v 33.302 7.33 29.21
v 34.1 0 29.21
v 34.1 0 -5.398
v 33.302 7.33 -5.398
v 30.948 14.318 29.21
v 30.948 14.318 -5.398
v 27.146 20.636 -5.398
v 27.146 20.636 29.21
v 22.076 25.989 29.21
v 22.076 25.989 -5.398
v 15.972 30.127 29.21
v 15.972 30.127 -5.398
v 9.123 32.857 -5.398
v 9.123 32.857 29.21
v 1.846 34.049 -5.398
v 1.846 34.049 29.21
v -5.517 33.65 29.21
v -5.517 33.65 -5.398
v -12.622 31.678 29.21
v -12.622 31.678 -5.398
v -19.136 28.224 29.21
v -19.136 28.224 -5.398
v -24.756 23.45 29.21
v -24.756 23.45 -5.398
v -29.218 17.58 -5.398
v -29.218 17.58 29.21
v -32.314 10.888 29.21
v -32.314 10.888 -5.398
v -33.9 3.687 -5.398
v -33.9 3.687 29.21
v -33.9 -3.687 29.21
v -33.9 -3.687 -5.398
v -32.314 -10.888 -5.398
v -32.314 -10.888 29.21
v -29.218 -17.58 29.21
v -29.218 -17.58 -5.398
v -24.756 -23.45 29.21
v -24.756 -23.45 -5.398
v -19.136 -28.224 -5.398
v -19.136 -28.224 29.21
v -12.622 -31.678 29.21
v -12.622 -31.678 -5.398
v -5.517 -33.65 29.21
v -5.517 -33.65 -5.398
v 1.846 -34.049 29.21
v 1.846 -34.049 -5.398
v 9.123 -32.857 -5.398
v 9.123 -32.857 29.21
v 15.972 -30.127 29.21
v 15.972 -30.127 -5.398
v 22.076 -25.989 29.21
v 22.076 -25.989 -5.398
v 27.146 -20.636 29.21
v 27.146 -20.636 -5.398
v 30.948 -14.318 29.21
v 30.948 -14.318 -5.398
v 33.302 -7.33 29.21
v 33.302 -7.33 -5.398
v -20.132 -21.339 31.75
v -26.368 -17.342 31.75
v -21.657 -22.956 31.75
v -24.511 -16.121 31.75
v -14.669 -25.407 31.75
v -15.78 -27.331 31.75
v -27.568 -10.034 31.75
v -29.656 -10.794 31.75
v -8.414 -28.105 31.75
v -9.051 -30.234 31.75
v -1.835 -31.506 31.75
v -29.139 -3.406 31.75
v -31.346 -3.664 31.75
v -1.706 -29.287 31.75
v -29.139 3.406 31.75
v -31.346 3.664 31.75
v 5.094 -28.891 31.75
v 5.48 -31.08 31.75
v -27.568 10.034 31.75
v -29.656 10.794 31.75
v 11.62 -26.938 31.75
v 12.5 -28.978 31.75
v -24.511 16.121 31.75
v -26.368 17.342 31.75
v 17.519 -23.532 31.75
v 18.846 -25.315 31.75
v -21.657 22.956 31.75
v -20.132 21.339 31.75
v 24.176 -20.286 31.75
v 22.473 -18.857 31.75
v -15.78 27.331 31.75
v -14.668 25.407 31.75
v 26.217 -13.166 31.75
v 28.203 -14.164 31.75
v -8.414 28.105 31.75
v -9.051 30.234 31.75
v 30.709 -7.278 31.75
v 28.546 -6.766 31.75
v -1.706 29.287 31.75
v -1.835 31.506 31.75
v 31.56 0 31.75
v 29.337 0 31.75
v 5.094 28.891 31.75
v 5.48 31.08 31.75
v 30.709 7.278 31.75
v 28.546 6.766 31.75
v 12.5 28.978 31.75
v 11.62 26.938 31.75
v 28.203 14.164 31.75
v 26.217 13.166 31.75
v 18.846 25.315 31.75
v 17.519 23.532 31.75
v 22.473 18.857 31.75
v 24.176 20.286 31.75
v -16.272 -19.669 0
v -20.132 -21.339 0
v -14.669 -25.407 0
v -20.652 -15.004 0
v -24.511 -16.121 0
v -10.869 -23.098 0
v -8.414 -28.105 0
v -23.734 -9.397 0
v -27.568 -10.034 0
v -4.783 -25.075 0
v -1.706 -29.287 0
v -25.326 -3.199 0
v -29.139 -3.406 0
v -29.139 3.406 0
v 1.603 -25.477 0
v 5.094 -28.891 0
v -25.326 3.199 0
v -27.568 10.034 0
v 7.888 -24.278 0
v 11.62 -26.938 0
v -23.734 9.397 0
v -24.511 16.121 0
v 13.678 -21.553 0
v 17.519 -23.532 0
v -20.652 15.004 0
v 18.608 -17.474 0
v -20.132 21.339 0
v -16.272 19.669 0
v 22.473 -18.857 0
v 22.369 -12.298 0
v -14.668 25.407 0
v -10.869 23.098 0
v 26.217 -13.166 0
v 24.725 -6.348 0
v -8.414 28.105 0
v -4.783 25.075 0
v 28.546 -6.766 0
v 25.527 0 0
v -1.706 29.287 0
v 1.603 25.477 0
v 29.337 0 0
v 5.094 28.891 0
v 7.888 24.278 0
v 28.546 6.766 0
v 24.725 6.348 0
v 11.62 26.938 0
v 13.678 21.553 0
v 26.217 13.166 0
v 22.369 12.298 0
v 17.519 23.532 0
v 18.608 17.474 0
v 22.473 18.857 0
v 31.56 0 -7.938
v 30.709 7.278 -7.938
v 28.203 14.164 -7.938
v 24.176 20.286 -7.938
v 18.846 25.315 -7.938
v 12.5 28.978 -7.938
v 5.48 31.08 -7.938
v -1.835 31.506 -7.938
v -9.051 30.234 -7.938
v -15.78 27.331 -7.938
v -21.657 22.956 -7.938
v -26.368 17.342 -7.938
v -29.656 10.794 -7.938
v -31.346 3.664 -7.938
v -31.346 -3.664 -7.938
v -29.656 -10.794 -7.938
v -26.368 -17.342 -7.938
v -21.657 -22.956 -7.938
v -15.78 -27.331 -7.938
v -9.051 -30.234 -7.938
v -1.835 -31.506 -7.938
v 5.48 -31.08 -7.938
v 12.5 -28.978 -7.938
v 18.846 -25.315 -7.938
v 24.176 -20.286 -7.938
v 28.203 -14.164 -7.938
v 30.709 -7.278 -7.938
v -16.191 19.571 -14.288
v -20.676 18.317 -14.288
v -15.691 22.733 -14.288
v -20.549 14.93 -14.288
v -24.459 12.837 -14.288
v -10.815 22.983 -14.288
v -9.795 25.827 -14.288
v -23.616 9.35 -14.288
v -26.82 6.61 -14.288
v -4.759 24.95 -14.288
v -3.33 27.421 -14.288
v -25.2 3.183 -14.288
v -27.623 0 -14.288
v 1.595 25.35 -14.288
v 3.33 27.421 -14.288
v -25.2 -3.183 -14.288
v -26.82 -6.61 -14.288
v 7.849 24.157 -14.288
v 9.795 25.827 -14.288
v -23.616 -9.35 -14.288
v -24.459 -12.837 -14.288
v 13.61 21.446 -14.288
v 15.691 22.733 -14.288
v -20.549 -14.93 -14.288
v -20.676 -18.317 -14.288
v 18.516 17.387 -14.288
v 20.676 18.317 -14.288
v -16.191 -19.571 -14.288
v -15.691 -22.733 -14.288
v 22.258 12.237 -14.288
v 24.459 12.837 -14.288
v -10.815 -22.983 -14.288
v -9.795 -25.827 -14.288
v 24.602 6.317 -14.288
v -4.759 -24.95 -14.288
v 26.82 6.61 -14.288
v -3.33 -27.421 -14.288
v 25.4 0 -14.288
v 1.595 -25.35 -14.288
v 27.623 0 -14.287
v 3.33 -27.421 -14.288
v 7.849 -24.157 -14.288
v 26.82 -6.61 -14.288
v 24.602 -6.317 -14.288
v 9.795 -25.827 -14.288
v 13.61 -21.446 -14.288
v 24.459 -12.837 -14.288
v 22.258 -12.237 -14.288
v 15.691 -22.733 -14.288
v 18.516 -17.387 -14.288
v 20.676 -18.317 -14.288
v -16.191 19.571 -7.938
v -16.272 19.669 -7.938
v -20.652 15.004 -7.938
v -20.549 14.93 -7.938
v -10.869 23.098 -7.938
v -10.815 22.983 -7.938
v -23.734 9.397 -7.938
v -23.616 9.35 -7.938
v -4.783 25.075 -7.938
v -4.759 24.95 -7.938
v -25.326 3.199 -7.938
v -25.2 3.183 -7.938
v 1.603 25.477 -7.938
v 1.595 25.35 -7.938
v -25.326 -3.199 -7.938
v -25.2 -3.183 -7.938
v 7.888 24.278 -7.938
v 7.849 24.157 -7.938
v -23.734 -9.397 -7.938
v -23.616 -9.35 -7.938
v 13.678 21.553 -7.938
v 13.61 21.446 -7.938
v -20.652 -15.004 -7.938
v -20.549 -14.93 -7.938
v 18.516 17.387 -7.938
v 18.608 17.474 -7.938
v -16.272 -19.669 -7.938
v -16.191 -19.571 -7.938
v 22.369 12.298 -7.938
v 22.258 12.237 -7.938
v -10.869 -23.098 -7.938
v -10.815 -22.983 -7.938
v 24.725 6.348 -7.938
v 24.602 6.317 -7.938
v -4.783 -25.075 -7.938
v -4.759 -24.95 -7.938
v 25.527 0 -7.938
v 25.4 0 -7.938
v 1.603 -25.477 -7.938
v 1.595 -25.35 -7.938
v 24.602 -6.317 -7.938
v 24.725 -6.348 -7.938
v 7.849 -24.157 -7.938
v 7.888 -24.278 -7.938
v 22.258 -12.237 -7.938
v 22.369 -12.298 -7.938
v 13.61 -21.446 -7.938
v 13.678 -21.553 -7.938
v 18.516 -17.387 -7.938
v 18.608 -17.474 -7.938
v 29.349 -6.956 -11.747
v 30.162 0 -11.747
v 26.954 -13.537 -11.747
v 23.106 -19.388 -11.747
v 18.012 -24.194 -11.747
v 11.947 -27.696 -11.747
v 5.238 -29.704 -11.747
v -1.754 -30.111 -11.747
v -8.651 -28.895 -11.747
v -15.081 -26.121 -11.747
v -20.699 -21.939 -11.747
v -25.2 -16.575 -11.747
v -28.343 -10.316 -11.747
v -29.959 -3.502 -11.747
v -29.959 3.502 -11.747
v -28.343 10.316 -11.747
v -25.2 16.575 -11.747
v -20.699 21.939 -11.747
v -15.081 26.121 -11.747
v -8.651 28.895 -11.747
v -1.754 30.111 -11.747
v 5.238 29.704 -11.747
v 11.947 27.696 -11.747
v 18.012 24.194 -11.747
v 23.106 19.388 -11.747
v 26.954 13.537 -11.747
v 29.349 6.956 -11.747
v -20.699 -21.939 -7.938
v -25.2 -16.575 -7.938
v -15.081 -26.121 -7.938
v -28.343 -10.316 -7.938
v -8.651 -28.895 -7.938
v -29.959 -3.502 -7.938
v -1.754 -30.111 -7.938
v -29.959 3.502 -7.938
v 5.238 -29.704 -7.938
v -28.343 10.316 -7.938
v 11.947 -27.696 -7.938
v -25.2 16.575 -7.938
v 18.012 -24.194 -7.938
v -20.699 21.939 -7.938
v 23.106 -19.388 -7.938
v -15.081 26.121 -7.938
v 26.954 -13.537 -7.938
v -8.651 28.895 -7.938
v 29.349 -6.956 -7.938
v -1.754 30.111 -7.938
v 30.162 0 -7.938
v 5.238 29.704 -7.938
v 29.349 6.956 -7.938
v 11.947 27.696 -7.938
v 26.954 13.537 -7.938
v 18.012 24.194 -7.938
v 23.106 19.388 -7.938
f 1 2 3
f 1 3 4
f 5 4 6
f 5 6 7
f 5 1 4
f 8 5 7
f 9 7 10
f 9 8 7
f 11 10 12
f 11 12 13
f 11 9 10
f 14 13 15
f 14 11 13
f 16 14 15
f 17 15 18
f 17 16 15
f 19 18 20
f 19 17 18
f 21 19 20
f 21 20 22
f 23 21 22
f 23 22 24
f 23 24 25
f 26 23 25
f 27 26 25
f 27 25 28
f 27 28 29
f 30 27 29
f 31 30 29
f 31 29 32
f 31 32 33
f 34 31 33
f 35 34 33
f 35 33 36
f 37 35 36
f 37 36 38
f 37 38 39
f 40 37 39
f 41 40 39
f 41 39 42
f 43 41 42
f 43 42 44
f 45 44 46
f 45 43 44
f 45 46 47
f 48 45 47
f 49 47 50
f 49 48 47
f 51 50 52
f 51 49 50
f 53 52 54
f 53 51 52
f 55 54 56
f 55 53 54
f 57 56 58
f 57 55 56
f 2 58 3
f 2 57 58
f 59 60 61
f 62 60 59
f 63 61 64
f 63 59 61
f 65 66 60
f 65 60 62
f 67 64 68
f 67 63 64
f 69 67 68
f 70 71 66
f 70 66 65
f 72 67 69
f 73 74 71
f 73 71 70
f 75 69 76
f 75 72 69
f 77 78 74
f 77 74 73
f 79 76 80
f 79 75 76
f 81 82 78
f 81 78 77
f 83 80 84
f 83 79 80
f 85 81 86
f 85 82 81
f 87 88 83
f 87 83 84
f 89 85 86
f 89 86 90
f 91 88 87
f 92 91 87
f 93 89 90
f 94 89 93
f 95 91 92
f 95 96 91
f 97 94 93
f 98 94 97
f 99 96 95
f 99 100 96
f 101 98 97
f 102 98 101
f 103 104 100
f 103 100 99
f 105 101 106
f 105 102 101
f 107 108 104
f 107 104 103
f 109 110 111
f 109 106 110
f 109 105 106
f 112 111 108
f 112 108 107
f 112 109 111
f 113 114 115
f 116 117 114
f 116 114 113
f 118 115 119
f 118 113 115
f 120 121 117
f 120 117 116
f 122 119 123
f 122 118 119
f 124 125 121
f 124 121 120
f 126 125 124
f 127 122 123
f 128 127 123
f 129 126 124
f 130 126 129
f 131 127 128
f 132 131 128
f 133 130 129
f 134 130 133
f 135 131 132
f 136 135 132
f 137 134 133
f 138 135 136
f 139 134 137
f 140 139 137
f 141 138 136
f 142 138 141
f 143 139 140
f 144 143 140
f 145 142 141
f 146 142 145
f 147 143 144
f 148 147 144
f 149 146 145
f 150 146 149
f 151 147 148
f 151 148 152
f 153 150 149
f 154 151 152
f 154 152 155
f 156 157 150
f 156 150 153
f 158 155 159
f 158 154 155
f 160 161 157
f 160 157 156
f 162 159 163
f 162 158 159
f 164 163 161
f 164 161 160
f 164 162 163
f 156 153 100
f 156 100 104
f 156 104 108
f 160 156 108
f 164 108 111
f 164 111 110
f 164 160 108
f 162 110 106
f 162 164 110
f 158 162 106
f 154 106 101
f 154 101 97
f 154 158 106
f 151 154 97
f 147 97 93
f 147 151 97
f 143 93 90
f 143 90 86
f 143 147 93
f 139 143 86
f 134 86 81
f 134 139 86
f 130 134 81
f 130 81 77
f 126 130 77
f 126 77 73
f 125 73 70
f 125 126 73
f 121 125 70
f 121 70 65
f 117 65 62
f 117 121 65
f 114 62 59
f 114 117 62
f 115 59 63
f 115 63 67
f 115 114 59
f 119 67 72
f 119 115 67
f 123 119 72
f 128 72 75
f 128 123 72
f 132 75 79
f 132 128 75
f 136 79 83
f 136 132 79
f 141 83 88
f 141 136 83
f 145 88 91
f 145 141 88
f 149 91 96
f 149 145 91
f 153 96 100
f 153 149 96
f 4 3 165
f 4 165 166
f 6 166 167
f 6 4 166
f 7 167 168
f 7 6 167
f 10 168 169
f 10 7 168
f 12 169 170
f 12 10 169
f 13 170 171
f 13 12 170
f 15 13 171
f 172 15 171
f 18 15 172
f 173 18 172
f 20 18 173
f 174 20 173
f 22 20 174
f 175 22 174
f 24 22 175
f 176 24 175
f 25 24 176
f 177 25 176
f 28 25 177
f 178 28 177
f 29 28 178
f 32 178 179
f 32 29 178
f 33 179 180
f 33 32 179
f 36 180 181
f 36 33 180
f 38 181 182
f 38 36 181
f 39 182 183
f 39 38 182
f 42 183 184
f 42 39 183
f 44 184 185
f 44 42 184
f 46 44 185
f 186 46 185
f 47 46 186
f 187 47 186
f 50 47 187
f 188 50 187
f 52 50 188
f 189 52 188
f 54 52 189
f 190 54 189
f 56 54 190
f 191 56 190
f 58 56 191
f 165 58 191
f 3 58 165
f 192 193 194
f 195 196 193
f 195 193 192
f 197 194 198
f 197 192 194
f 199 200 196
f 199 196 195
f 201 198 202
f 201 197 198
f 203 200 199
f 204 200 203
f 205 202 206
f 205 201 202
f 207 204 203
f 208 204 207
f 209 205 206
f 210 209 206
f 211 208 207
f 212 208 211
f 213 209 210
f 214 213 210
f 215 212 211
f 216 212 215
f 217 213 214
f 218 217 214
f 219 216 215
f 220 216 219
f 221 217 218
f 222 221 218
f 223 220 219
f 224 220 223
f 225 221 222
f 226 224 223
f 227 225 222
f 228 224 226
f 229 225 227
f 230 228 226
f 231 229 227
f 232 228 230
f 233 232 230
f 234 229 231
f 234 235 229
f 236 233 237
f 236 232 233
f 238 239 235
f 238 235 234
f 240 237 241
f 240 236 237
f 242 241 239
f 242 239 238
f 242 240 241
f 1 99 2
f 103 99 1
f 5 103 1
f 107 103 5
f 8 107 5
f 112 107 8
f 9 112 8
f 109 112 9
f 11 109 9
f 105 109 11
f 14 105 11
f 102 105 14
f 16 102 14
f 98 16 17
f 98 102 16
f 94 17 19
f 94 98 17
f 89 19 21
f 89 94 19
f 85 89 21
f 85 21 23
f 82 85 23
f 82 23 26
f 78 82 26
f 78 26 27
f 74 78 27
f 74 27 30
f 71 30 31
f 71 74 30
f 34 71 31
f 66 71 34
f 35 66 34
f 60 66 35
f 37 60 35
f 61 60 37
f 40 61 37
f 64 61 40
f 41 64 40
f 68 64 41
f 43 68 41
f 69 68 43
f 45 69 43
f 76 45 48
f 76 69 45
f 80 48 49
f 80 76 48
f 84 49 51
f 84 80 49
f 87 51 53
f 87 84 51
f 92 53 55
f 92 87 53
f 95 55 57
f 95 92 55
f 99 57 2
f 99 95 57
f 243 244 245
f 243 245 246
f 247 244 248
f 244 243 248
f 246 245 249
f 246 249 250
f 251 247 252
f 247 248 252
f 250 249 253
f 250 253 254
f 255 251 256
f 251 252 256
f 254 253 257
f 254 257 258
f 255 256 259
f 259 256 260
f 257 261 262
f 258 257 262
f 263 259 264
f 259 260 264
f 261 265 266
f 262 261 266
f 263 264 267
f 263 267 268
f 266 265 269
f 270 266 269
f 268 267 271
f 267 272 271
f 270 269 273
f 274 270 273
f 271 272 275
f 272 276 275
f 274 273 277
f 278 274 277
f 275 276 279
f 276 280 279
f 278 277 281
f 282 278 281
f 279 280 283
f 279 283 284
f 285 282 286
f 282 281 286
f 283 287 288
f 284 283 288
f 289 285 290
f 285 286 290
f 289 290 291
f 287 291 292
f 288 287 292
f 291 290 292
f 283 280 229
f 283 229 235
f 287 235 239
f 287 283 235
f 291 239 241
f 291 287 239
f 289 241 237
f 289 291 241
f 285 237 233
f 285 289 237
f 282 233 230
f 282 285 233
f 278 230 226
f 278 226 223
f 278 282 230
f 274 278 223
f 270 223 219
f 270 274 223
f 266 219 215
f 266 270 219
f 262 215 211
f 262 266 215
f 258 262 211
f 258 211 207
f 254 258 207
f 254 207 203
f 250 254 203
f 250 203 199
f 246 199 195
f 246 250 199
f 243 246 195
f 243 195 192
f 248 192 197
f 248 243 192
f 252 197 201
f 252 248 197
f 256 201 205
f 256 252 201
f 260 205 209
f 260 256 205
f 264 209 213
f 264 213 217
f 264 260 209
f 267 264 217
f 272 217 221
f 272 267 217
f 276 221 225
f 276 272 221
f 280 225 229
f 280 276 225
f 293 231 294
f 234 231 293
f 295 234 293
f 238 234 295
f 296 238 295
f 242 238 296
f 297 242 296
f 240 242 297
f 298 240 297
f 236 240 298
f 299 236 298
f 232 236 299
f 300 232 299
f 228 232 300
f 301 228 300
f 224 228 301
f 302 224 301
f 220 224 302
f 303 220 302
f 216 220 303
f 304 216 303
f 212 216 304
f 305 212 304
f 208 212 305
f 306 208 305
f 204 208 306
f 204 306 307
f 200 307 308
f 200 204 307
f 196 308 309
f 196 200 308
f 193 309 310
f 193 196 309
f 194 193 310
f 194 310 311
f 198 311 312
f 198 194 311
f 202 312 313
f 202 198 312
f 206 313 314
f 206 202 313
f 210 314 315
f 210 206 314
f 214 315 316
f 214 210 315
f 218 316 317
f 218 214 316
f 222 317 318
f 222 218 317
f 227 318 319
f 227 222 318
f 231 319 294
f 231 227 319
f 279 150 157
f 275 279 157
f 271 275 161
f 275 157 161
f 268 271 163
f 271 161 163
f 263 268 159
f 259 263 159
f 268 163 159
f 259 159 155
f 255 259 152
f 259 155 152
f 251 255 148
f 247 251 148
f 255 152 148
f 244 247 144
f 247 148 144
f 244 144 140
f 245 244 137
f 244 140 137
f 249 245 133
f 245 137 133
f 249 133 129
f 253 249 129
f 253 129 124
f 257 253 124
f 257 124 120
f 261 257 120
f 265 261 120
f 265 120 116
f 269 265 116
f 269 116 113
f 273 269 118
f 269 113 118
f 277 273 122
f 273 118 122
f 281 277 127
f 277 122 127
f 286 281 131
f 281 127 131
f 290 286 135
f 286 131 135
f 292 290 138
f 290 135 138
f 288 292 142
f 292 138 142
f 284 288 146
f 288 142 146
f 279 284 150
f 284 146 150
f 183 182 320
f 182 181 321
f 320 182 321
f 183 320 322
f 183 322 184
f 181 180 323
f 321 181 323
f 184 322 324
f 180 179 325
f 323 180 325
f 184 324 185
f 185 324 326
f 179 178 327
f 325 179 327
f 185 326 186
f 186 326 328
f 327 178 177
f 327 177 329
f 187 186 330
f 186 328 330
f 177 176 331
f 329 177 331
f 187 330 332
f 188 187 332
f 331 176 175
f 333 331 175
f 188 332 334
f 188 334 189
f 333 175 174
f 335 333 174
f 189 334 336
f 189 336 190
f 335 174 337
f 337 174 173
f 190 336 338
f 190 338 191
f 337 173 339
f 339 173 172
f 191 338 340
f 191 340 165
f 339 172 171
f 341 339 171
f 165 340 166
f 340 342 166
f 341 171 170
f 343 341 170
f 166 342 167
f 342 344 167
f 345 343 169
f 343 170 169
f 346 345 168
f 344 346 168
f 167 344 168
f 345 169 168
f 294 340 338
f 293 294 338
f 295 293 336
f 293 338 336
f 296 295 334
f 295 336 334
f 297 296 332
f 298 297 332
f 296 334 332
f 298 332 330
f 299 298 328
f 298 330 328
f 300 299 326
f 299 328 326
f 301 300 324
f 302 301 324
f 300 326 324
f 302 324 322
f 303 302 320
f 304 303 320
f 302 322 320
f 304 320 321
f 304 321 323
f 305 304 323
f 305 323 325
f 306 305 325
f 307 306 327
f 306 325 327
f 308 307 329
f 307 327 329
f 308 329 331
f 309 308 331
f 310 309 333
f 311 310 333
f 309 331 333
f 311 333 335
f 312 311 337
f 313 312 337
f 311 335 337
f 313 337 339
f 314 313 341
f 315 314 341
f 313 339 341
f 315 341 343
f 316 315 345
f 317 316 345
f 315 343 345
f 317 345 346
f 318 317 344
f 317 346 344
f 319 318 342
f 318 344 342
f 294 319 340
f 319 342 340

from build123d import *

# Parameters (mm, degrees)
F0_R     = 34.0995
F0_R_2   = 29.337
F1_DEPTH = 31.75
F0_R_3   = 25.527
F2_DEPTH = 7.9375
F3_R     = 30.1625
F3_R_2   = 25.4
F4_DEPTH = 6.35
F5_SIZE  = 2.54


with BuildPart() as f1:
    # F0 (on Top) → F1 (new body)
    with BuildSketch(Plane.XY):
        Circle(F0_R)
        Circle(F0_R_2, mode=Mode.SUBTRACT)
    extrude(amount=F1_DEPTH)

    # F0 (on Top) → F2 (join)
    with BuildSketch(Plane.XY):
        Circle(F0_R)
        Circle(F0_R_2, mode=Mode.SUBTRACT)
        Circle(F0_R_2)
        Circle(F0_R_3, mode=Mode.SUBTRACT)
    extrude(amount=-F2_DEPTH)

    # F3 (on face) → F4 (join)
    with BuildSketch(Plane(origin=(0, 0, -7.9375), x_dir=(1, 0, 0), z_dir=(0, 0, -1))):
        Circle(F3_R)
        Circle(F3_R_2, mode=Mode.SUBTRACT)
    extrude(amount=F4_DEPTH)

    # F5
    f5_edges = [f1.edges().sort_by_distance(p)[0] for p in [
        (-34.0995, 0, 31.75),
        (-34.0995, 0, -7.9375),
        (-30.1625, 0, -14.2875),
    ]]
    chamfer(f5_edges, length=F5_SIZE)


solid = f1.part
